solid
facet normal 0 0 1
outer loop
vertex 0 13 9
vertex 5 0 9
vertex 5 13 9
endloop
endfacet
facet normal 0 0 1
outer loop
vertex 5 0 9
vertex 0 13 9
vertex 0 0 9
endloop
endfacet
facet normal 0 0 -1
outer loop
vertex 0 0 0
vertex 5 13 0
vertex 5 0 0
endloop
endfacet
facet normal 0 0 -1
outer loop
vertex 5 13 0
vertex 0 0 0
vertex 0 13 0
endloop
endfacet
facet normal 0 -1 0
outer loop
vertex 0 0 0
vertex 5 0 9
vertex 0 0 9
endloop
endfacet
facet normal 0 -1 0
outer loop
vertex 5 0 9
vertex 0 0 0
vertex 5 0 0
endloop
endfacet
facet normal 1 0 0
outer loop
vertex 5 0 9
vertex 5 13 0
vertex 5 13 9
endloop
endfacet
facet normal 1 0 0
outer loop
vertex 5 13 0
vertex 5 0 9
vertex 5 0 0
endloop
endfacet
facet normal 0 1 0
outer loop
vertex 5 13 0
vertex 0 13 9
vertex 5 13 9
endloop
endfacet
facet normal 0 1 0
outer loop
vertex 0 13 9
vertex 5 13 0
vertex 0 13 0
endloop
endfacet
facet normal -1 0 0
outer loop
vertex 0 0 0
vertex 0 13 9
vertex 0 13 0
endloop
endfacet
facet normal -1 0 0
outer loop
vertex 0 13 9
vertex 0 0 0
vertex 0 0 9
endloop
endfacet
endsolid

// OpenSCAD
// Generated by SolidPython 1.0.1 on 2020-07-29 00:46:54


cube(size = [5, 13, 9]);
/***********************************************
*********      SolidPython code:      **********
************************************************
 
# import packages: SolidPython
from solid import *
from solid.utils import *
from itertools import chain, combinations, permutations


class Resize:

    def __init__(self, scad_file):
        self.scad_file = scad_file
        #self.scad_file = import_scad(scad_file)
        # cone/cylinder param:
        self.r1 = 0
        self.r2 = 0
        self.h = 0
        # rectangular prism param:
        self.w = 0
        self.l = 0
        # ellipse param:
        self.r = 0

    # import OpenScad code (file name corresponds to shape)


    # classify shape + parameters
    def assign(self, param1, param2, param3):
        if self.scad_file == 'cone.scad':
            self.r1 = param1
            self.r2 = param2
            self.h = param3
        elif self.scad_file == 'cylinder.scad':
            self.r1 = param1
            self.r2 = param2
            self.h = param3
        elif self.scad_file == 'rectangularPrism.scad':
            self.h = param1
            self.l = param2
            self.w = param3
        else:
            self.r = param1
            self.h = param2

    # resize parameters
    def iterate(self):
        x = range(3, 20, 2)
        i = 1
        if self.scad_file == 'cone.scad':
            tempList = list(permutations(x, 2))
            for temp in tempList:
                param1 = temp[0]
                param2 = temp[1]
                filepath = 'produced_scad_files/' + 'cone' + str(param1) + '_' + str(param2) + '_' + '.scad'
                scad_render_to_file(cylinder(h=param1, r1=param2, r2=0), filepath)

        elif self.scad_file == 'cylinder.scad':
            tempList = list(permutations(x, 3))
            for temp in tempList:
                param1 = temp[0]
                param2 = temp[1]
                filepath = 'produced_scad_files/' + 'cylinder' + str(param1) + '_' + str(param2) + '_' + '.scad'
                scad_render_to_file(cylinder(h=param1, r1=param2, r2=param2), filepath)

        elif self.scad_file == 'rectangularPrism.scad':
            tempList = list(permutations(x, 3))
            for temp in tempList:
                param1 = temp[0]
                param2 = temp[1]
                param3 = temp[2]
                filepath = 'produced_scad_files/' + 'rectangularPrism' + str(param1) + '_' + str(param2) + '_' + str(
                    param3) + '.scad'
                scad_render_to_file(cube(size=(param1, param2, param3)), filepath)

        elif self.scad_file == 'ellipse.scad':
            tempList = list(permutations(x, 4))
            for temp in tempList:
                param1 = temp[0]
                param2 = temp[1]
                param3 = temp[2]
                param4 = temp[3]
                filepath = 'produced_scad_files/' + 'ellipse' + str(param1) + '_' + str(param2) + '_' + str(param3) + '_' + str(param4) + '.scad'
                scad_render_to_file(scale([param1, param2, param3])(sphere(r=param4)), filepath)

    def render_to_scadfile(self):
        scad_render_to_file(scad, 'example.scad') 
 
************************************************/
